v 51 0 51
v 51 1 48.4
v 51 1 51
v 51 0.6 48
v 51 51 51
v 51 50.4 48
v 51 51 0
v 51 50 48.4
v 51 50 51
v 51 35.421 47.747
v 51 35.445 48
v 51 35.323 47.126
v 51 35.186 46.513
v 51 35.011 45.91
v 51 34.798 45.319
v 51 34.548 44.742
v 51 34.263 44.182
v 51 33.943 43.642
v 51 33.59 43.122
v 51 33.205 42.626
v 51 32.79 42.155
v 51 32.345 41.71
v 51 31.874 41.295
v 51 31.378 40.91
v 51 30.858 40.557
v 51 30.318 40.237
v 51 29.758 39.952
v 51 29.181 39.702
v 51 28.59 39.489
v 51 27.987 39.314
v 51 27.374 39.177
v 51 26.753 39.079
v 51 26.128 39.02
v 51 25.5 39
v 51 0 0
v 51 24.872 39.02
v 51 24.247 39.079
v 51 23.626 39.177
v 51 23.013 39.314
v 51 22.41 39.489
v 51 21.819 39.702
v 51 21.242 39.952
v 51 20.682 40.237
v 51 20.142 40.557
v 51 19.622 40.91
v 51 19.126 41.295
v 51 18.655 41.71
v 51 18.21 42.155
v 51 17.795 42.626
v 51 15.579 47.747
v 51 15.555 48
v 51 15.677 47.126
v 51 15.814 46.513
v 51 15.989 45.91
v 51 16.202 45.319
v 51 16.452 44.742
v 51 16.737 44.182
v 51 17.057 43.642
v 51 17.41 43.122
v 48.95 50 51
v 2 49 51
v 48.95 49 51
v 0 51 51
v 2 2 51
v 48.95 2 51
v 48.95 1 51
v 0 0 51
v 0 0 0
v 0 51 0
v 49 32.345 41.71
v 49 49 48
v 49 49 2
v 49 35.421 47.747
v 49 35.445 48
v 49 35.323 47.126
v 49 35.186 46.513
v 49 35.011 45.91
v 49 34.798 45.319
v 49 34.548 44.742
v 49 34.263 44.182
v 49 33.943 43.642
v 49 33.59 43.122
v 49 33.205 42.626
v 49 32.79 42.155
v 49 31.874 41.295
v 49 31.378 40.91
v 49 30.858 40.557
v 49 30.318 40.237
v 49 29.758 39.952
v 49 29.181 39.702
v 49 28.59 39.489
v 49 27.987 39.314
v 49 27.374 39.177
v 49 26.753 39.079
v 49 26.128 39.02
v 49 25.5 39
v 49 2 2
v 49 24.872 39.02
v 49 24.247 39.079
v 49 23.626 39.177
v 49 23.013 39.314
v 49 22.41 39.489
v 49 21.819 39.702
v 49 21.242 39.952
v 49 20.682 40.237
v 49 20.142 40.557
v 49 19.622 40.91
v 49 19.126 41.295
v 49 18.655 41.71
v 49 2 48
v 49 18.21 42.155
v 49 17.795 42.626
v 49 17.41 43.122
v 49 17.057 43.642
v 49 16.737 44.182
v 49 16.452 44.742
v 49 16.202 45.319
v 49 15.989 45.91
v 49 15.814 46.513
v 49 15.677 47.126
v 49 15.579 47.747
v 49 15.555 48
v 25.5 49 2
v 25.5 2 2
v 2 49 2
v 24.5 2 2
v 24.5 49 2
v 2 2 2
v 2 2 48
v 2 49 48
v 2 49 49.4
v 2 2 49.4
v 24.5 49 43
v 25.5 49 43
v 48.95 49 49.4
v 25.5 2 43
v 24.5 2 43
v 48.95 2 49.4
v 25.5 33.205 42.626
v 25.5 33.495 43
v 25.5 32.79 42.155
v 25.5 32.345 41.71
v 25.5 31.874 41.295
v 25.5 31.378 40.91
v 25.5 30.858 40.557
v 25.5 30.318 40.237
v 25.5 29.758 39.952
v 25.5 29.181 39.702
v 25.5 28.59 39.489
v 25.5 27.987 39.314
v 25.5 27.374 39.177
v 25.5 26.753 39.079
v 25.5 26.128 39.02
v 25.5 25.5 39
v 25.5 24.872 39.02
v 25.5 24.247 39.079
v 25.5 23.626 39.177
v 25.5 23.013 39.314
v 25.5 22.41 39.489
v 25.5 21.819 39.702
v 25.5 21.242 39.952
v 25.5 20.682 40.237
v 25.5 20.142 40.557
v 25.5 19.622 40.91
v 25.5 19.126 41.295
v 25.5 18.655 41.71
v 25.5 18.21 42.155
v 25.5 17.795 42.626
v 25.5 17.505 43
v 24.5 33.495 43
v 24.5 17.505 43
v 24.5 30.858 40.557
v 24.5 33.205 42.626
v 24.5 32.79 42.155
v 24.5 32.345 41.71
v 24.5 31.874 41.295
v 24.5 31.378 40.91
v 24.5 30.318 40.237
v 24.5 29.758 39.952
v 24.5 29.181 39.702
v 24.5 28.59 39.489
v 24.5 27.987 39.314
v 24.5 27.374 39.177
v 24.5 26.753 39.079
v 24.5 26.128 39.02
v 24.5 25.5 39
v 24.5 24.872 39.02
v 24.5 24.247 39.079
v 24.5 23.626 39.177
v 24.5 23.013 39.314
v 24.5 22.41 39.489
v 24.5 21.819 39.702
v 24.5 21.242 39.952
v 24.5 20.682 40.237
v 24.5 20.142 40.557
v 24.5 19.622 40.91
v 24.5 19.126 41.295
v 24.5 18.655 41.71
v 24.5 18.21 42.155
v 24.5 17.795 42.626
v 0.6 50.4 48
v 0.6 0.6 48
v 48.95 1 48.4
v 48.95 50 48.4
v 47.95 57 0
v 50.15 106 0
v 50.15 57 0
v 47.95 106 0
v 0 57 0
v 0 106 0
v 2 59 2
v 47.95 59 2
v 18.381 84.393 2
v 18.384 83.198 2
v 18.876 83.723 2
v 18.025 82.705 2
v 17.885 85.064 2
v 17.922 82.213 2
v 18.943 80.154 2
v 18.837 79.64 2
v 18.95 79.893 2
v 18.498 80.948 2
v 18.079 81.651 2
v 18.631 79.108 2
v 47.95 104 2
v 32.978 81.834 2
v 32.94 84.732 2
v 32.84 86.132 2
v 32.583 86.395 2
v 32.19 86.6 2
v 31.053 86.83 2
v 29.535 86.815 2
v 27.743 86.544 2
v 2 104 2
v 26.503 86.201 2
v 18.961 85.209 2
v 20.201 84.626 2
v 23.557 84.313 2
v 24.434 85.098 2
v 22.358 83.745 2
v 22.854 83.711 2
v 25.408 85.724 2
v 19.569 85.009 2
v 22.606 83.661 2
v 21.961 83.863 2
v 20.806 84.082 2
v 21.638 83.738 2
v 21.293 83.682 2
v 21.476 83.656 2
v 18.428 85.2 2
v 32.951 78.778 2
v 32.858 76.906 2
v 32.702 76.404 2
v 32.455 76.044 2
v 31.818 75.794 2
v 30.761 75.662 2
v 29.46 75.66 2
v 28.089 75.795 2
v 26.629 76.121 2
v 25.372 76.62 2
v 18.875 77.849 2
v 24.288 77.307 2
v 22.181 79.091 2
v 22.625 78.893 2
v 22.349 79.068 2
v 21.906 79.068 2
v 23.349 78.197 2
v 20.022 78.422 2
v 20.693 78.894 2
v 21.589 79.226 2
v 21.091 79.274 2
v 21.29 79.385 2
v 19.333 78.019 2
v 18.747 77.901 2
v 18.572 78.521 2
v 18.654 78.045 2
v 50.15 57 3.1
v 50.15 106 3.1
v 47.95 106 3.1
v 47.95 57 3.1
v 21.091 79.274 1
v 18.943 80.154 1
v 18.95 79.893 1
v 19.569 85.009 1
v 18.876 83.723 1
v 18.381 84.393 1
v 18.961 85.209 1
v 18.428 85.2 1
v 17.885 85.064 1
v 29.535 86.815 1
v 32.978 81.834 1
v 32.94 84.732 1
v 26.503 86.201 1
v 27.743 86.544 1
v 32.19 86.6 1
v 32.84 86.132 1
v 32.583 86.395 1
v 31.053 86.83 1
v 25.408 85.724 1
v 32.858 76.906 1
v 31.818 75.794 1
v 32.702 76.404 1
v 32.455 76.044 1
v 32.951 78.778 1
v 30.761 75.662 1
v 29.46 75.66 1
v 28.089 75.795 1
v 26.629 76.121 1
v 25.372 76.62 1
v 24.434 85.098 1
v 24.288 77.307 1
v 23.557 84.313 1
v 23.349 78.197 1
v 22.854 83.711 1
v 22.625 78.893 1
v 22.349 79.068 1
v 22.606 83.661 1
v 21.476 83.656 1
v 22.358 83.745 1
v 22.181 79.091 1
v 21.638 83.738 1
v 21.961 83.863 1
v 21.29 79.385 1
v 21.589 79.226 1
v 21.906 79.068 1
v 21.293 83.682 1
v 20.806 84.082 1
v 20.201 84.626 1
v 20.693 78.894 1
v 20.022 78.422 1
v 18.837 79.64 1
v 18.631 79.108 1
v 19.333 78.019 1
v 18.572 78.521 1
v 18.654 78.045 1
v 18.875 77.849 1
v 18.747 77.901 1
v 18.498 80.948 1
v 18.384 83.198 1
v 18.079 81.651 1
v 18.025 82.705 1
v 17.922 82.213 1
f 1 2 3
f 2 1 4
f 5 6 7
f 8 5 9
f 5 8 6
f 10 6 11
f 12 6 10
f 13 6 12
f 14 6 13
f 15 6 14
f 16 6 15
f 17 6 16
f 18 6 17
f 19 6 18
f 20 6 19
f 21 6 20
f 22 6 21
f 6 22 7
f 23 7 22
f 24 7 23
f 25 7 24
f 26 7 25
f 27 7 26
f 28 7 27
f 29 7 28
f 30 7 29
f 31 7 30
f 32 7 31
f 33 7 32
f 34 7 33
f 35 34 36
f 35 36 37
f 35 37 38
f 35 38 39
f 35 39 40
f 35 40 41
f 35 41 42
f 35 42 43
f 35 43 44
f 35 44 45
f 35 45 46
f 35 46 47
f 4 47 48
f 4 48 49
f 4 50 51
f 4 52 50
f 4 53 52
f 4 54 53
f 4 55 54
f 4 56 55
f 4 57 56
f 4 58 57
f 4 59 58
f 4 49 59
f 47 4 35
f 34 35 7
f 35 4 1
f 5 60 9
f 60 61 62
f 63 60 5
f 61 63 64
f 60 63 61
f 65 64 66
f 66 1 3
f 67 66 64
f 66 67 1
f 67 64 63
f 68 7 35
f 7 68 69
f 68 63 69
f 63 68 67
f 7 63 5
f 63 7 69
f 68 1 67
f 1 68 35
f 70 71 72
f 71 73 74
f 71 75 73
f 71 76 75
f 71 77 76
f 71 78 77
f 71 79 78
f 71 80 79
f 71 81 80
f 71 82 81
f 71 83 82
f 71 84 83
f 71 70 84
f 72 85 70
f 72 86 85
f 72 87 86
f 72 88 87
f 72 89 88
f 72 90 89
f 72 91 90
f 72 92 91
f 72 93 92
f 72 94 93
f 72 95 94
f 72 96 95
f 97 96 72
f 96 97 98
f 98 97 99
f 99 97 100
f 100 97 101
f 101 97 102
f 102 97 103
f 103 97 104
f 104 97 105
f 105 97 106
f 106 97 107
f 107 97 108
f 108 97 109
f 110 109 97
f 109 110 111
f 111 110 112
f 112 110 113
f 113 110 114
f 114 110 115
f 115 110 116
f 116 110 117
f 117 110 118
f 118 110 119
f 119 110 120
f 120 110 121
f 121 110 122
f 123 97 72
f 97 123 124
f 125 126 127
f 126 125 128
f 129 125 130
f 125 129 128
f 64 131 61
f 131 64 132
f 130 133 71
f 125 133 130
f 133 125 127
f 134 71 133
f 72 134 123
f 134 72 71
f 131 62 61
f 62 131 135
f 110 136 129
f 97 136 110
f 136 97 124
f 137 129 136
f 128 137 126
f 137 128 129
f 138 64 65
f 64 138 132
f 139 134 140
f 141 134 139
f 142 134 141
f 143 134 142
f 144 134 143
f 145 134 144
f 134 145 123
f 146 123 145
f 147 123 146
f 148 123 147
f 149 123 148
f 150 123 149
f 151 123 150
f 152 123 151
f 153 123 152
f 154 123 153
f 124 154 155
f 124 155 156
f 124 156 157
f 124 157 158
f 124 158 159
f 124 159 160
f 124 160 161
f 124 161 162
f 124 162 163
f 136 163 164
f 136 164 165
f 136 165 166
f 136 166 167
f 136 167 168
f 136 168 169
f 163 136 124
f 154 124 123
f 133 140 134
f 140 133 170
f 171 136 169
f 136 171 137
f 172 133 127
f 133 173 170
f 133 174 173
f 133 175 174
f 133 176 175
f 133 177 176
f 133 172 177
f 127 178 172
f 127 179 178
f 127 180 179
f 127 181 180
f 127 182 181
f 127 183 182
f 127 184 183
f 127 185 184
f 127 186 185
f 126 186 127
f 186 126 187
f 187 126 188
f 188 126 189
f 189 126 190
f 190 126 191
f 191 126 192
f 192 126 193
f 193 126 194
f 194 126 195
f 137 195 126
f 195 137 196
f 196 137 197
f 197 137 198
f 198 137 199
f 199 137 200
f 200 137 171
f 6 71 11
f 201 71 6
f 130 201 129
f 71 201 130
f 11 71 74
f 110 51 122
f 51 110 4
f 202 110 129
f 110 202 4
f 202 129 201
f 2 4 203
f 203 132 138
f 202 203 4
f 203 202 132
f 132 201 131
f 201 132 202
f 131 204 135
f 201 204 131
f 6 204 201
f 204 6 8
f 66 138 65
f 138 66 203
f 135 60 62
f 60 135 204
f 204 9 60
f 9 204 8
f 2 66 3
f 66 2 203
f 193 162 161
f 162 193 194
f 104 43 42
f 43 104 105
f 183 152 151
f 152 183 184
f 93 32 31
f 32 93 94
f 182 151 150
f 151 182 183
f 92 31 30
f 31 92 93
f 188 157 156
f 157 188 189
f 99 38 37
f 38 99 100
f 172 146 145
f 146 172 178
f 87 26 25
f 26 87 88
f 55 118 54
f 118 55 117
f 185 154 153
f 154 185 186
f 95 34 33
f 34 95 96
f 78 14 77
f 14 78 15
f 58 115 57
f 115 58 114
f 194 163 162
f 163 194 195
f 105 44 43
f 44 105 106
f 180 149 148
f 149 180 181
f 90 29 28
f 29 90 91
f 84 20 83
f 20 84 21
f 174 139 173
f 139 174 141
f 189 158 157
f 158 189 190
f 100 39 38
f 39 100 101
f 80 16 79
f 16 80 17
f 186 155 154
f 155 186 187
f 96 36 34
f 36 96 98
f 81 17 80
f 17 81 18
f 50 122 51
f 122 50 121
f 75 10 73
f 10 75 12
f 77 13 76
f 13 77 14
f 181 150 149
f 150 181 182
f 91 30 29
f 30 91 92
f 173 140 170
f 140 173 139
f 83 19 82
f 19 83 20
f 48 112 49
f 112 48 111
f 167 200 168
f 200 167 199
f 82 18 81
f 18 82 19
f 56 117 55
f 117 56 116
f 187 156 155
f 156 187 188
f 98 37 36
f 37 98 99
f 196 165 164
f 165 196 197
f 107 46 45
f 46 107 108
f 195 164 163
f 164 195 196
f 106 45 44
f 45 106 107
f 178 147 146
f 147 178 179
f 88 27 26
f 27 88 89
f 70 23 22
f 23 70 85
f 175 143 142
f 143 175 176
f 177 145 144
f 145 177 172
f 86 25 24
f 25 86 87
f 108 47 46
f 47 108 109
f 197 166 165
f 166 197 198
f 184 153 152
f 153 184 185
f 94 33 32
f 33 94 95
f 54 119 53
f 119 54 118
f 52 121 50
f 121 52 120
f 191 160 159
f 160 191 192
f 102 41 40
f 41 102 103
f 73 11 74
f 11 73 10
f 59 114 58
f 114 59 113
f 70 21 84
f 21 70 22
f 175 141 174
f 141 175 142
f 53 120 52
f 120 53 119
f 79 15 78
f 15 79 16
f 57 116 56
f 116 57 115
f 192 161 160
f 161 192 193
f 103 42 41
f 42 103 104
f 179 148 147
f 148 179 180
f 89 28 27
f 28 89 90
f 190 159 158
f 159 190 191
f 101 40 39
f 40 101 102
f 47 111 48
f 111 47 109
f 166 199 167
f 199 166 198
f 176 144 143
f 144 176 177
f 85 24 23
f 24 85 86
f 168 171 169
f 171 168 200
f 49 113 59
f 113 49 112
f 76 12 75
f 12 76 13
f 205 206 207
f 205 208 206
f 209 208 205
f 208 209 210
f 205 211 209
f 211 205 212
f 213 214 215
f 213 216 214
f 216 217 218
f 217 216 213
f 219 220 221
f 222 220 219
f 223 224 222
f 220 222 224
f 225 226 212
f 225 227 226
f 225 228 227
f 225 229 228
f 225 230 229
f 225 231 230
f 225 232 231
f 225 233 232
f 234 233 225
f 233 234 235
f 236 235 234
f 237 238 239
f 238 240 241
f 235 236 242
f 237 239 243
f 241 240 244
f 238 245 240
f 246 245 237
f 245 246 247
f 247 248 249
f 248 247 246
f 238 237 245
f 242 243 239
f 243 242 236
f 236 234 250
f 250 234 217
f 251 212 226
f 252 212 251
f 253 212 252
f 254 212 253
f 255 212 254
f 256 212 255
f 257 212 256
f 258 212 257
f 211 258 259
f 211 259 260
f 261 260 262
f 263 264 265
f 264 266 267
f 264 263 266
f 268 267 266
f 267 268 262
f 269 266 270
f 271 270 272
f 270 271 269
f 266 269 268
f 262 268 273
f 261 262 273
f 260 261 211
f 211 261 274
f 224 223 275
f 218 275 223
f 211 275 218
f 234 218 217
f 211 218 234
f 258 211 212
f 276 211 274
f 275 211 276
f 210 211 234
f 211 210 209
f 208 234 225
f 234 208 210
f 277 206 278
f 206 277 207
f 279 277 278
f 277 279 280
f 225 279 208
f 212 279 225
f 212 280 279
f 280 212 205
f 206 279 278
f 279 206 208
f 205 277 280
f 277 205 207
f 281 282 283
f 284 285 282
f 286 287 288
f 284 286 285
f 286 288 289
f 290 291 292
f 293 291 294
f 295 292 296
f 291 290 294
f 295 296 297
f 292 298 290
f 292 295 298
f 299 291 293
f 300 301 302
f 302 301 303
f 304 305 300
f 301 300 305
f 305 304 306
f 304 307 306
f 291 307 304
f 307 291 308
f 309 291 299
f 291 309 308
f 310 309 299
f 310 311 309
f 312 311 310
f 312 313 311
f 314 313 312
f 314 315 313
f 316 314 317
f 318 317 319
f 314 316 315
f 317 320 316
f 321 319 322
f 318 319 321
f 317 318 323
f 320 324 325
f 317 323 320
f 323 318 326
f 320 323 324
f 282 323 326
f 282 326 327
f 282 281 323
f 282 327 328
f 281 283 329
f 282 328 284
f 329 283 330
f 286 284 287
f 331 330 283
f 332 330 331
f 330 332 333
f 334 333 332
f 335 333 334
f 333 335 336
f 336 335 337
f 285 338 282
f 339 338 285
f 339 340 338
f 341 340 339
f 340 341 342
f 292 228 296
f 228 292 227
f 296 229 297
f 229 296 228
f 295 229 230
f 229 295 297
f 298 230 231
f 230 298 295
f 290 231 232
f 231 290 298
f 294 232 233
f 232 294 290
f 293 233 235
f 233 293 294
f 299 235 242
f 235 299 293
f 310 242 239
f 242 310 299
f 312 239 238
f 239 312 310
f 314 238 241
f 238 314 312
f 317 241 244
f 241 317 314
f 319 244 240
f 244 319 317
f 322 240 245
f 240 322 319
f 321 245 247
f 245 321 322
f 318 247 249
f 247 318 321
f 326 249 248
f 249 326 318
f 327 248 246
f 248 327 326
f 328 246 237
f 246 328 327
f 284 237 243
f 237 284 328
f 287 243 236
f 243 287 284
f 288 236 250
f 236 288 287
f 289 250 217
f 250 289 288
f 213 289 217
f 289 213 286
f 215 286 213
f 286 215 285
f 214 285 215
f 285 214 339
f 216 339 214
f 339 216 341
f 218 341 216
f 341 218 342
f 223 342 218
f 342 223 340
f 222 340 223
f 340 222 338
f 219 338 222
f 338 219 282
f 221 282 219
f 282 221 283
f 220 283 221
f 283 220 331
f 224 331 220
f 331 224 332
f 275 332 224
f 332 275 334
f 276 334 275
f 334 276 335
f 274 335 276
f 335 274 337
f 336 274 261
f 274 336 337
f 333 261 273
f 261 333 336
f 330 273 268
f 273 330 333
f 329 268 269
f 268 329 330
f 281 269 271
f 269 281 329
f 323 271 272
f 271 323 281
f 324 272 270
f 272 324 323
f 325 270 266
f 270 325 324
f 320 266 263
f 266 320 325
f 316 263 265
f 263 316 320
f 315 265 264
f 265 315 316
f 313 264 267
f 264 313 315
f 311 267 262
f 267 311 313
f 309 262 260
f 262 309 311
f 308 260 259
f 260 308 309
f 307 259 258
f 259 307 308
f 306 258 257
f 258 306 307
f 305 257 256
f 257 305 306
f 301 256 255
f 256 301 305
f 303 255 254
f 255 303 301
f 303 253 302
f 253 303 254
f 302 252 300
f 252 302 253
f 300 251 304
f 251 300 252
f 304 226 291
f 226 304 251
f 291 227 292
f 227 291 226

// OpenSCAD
// file: carcassonne_box.scad
/**
 * @file carcassonne_box.scad
 * @author Conlan Wesson
 * Template for Carcossonne boxes.
 * @copyright Creative Commons Attribution-NonCommercial-ShareAlike 4.0
 */

mm = 1;
cm = 10*mm;

width = 47*mm;
thick = 2.5*mm;
wall = 2*mm;

/**
 * Lid for box.
 * @param count Number of cards.
 * @param columns Number of columns.
 * @param icon Path to icon DXF file.
 * @param rot Icon rotation in degrees.
 * @param mult Icon scale.
 * @param xoff X-offset of icon from center.
 * @param yoff Y-offset of icon from center.
 */
module carcassonne_lid(count, columns=1, icon=false, rot=0, mult=1, xoff=0, yoff=0, g=0){
	length = (thick * count) + ((width/2) - ((thick * count) % (width/2)));
	w = length+(1.5*wall)+.1;
	l = (width*columns)+wall;
	h = wall;
	d = 2;

	CubePoints = [
		[ 0-g, 0-g,   0 ],  //0
		[ w+g, 0-g,   0 ],  //1
		[ w+g, l+g,   0 ],  //2
		[ 0-g, l+g,   0 ],  //3
		[   d,   d, h+g ],  //4
		[   w,   d, h+g ],  //5
		[   w, l-d, h+g ],  //6
		[   d, l-d, h+g ]   //7
	];
	
	CubeFaces = [
		[0,1,2,3],  // bottom
		[4,5,1,0],  // front
		[7,6,5,4],  // top
		[5,6,2,1],  // right
		[6,7,3,2],  // back
		[7,4,0,3]   // left
	];
	
	
	difference(){
		union(){
			polyhedron( CubePoints, CubeFaces );
			translate([w-wall-.15,0,0]) cube([wall+.2,l, (1.5*wall)+.1]);
		}
		if(icon){
			translate([w/2+xoff,l/3+yoff,h-(wall/2)]){
				linear_extrude(height=(wall)+.1){
					rotate(rot) scale(mult) import(icon);
				}
			}
		}
	}
}

/**
 * Carcassonne card box.
 * @param count Number of cards.
 * @param dividers Array of divider positions.
 * @param columns Number of columns.
 */
module carcassonne_box(count, dividers=[], columns=1){
	length = (thick * count) + ((width/2) - ((thick * count) % (width/2)));
	difference(){
		union(){
			difference(){
				// Outer walls
				cube([length+(2*wall), (width*columns)+(2*wall), width+(2*wall)]);
				// Cavity
				translate([wall, wall, wall]){
					cube([length, width*columns, (width+wall)+.1]);
				}
			}
			// Dividers
			for(col = [0:columns-1]){
				for(div = dividers[col]){
					translate([(div*(width/2))+(wall/2), width*col+wall, 0]) cube([wall/2, width, width-(2*wall)]);
				}
				if(col > 0){
					translate([0, width*col+(wall/2), 0]) cube([length+(2*wall), wall/2, width-(2*wall)]);
				}
			}
		}
		union(){
			// Notch
			for(col = [0:columns-1]){
				translate([wall, wall+(width*col), wall]){
					translate([0, width/2, width])
					rotate([0, 90, 0]){
						cylinder(r=10, h=length+(2*wall), $fn=100);
					}
				}
			}
			// Track
			translate([wall/2,wall/2,width+wall/2]) carcassonne_lid(count, columns, g=0.4);
		}
	}
}
// main file
/**
 * @file robbers.scad
 * @author Conlan Wesson
 * The Robbers Carcossonne box.
 * @copyright Creative Commons Attribution-NonCommercial-ShareAlike 4.0
 */

include <carcassonne_box.scad>

count = 16;
dividers = [[1]];
columns = 1;

carcassonne_box(count, dividers, columns);
translate([0,width*columns+10,0]) carcassonne_lid(count, columns, icon="robbers.dxf", rot=90, mult=0.6, xoff=10, yoff=0);
